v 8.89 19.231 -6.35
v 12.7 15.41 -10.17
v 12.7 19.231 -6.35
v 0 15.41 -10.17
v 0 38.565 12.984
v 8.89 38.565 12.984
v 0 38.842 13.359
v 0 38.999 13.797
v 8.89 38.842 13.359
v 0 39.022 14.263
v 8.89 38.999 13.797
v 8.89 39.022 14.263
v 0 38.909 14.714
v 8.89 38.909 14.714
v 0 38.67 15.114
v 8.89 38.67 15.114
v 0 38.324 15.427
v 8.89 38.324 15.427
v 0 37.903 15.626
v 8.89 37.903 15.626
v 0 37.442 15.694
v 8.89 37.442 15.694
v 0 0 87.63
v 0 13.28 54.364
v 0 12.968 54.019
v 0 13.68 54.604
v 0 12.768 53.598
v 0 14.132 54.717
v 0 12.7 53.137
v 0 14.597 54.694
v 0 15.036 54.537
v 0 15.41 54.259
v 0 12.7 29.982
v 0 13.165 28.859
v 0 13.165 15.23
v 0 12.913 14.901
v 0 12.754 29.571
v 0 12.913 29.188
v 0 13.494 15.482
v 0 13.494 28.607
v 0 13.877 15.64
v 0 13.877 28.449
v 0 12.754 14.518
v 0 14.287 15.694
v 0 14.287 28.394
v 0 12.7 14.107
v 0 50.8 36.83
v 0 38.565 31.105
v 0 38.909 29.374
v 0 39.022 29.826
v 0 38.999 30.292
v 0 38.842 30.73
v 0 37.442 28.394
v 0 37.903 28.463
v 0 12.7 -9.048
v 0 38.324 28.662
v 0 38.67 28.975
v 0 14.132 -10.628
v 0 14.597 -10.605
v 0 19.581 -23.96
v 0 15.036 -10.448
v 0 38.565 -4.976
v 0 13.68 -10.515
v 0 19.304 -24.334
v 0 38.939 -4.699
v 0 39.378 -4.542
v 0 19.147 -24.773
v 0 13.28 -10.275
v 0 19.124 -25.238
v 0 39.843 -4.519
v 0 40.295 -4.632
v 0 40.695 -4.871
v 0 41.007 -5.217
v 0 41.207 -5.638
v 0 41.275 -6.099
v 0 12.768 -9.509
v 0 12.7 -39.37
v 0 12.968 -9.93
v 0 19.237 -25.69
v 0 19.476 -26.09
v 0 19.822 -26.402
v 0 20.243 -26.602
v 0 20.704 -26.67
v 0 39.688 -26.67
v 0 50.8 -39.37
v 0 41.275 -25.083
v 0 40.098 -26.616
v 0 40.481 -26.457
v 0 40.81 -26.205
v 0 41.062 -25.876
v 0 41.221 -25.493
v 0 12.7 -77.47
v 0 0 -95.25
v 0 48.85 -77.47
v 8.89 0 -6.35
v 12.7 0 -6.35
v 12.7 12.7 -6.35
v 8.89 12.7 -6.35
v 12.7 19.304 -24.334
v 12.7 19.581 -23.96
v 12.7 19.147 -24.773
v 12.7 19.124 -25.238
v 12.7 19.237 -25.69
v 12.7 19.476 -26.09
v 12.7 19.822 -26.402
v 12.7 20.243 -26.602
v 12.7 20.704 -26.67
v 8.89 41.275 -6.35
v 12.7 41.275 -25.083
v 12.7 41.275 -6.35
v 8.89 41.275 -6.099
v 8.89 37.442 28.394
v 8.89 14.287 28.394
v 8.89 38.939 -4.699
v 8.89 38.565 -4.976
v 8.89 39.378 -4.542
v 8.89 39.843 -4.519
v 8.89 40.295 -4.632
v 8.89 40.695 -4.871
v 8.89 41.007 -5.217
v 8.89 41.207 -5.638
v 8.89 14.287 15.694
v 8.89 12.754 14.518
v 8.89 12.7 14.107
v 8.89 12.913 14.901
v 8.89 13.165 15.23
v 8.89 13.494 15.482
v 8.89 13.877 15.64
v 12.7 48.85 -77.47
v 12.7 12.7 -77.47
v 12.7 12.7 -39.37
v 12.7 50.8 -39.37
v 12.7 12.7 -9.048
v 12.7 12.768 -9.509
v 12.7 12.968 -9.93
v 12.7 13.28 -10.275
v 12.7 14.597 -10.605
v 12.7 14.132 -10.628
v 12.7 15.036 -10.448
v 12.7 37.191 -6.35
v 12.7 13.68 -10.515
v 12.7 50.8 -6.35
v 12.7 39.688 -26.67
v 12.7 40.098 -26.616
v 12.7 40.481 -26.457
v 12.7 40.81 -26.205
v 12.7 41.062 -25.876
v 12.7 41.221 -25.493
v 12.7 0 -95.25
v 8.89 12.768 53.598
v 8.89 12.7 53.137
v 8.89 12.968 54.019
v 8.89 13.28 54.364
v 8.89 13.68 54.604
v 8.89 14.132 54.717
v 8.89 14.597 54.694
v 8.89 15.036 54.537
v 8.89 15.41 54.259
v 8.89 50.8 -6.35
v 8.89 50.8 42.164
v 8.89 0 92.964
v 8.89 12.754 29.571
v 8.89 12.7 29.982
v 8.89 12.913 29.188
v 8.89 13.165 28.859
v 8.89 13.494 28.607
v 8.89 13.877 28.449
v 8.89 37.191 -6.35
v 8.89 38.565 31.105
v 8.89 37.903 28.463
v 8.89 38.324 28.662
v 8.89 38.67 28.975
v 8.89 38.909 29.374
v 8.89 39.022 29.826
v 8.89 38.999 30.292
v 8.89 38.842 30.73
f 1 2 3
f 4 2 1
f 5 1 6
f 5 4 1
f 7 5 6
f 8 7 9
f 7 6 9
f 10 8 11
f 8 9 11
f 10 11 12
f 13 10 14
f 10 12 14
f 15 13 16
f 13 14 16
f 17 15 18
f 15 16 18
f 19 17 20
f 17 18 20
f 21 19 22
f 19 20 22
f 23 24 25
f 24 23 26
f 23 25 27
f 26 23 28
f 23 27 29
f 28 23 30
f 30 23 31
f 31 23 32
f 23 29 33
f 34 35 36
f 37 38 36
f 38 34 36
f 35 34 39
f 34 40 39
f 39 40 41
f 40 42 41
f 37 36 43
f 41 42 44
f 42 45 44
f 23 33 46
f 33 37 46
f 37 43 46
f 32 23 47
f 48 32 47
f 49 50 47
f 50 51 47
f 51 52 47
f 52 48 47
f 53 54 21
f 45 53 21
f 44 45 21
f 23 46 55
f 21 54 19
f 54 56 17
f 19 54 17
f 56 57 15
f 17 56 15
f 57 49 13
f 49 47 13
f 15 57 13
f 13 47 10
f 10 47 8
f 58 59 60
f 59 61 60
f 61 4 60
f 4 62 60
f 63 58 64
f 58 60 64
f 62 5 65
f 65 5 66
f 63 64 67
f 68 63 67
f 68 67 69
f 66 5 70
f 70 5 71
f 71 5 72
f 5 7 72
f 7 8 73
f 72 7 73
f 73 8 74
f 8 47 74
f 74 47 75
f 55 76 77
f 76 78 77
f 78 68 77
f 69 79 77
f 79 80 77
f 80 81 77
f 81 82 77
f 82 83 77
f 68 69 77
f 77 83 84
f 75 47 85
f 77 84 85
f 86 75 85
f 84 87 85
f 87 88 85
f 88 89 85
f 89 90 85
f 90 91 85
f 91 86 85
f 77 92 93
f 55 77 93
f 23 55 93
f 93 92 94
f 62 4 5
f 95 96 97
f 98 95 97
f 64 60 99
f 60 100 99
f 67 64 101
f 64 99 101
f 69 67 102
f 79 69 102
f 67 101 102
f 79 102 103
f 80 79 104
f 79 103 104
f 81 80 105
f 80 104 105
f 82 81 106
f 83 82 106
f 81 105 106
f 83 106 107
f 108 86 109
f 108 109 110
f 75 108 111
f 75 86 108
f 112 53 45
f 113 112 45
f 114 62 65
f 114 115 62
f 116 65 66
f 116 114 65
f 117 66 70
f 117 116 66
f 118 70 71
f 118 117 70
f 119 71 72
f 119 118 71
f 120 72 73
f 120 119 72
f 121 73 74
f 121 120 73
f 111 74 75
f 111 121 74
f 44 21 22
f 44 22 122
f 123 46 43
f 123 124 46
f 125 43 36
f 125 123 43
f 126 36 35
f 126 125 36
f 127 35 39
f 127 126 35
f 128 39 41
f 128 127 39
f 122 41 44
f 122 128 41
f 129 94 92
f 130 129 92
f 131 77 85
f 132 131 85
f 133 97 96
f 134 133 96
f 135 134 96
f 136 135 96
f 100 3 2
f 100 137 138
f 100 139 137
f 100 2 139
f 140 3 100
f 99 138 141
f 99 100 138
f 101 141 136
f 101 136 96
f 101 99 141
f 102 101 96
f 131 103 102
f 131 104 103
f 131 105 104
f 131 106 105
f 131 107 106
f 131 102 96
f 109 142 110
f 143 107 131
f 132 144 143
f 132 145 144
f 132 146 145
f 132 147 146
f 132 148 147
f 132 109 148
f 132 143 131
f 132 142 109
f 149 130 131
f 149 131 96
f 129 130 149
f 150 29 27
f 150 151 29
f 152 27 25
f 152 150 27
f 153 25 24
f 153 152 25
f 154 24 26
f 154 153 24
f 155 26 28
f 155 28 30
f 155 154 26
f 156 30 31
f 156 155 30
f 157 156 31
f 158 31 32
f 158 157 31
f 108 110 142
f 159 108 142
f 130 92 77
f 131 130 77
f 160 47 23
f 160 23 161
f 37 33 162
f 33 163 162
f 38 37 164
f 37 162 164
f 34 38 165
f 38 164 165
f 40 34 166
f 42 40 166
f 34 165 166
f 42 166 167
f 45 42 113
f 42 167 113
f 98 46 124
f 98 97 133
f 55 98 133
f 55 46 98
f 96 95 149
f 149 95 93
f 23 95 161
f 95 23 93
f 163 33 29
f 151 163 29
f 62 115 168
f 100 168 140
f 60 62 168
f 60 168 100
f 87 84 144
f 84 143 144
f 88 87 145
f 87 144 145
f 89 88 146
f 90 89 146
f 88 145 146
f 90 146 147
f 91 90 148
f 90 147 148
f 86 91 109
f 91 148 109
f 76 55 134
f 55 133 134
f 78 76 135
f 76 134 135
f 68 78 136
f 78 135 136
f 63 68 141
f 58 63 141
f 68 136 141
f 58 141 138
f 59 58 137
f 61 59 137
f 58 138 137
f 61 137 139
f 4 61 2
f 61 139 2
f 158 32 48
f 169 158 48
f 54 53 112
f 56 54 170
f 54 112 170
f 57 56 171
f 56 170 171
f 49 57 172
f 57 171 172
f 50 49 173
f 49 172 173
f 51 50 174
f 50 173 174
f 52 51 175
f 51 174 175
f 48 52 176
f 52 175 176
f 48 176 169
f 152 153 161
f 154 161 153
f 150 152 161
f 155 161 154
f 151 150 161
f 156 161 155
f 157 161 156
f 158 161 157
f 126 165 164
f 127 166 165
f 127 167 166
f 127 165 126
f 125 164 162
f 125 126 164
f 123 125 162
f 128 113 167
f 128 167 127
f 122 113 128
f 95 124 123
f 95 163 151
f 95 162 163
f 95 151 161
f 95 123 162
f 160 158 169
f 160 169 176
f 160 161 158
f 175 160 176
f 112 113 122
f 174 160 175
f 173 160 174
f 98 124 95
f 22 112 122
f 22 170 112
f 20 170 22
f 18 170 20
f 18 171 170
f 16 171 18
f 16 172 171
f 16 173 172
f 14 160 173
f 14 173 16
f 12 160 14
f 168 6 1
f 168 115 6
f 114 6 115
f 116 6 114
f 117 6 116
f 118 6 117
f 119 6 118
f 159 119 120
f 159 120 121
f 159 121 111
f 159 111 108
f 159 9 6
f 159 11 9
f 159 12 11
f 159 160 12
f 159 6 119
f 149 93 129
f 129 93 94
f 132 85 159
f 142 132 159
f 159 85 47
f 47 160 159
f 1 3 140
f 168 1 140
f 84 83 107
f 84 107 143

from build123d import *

# Parameters (mm, degrees)
BOSS_EXTRUDE1_DEPTH    = 12.7
CUT_EXTRUDE1_START     = -62.002468855
CUT_EXTRUDE1_OUTLINE_W = 16
CUT_EXTRUDE1_OUTLINE_H = 80
CUT_EXTRUDE1_DEPTH     = 4.960197509
CUT_EXTRUDE2_START     = 12.7
CUT_EXTRUDE2_DEPTH     = 3.81
CUT_EXTRUDE3_REACH     = 110.694
FILLET1_R              = 1.5875


# Read off the part's stored shape, not the designer's step: Cut-Extrude1
with BuildPart() as part:
    # Sketch1 → Boss-Extrude1 (new body)
    with BuildSketch(Plane(origin=(0, 0, 0), x_dir=(0, 0, -1), z_dir=(1, 0, 0))):
        Polygon((-44.45, 50.8), (-95.25, 0), (95.25, 0), (77.47, 48.850148518), (77.47, 12.7), (39.37, 12.7), (39.37, 50.8), align=None)
    extrude(amount=BOSS_EXTRUDE1_DEPTH)

    # Cut-Extrude1 outline → Cut-Extrude1 (cut)
    with BuildSketch(Plane(origin=(0, 0, 0), x_dir=(0.920574617898324, 0.27617238536949745, 0.27617238536949446), z_dir=(0.39056673294247013, -0.6509445549041233, -0.6509445549041163)).offset(CUT_EXTRUDE1_START)):
        with Locations((31, 29)):
            Rectangle(CUT_EXTRUDE1_OUTLINE_W, CUT_EXTRUDE1_OUTLINE_H)
    extrude(amount=CUT_EXTRUDE1_DEPTH, mode=Mode.SUBTRACT)

    # Sketch1<4> → Cut-Extrude2 (cut)
    with BuildSketch(Plane(origin=(0, 0, 0), x_dir=(0, 0, -1), z_dir=(1, 0, 0)).offset(CUT_EXTRUDE2_START)):
        Polygon((-44.45, 50.8), (-95.25, 0), (6.35, 0), (6.35, 50.8), align=None)
    extrude(amount=-CUT_EXTRUDE2_DEPTH, mode=Mode.SUBTRACT)

    # Sketch3 → Cut-Extrude3 (cut, up to next)
    with BuildSketch(Plane.ZY, mode=Mode.PRIVATE) as cut_extrude3_sk1:
        Polygon((56.969487758, 12.7), (28.394487758, 41.275), (28.394487758, 12.7), align=None)
    cut_extrude3_tool1 = extrude(cut_extrude3_sk1.sketch, amount=-CUT_EXTRUDE3_REACH, mode=Mode.PRIVATE) & part.part
    # Sketch3 → Cut-Extrude3 (cut, up to next)
    with BuildSketch(Plane.ZY, mode=Mode.PRIVATE) as cut_extrude3_sk2:
        Polygon((15.694487758, 41.275), (15.694487758, 12.7), (-12.880512242, 12.7), align=None)
    cut_extrude3_tool2 = extrude(cut_extrude3_sk2.sketch, amount=-CUT_EXTRUDE3_REACH, mode=Mode.PRIVATE) & part.part
    # Sketch3 → Cut-Extrude3 (cut, up to next)
    with BuildSketch(Plane.ZY, mode=Mode.PRIVATE) as cut_extrude3_sk3:
        Polygon((-2.266024484, 41.275), (-26.67, 16.871024484), (-26.67, 41.275), align=None)
    cut_extrude3_tool3 = extrude(cut_extrude3_sk3.sketch, amount=-CUT_EXTRUDE3_REACH, mode=Mode.PRIVATE) & part.part
    add(cut_extrude3_tool1.solids().sort_by_distance((0, 22.225, 37.919488))[0], mode=Mode.SUBTRACT)
    add(cut_extrude3_tool2.solids().sort_by_distance((0, 22.225, 6.169488))[0], mode=Mode.SUBTRACT)
    add(cut_extrude3_tool3.solids().sort_by_distance((0, 33.140341, -18.535341))[0], mode=Mode.SUBTRACT)

    # Fillet1
    fillet1_edges = [part.edges().sort_by_distance(p)[0] for p in [
        (4.445, 12.7, 56.969487758),
        (4.445, 12.7, 28.394487758),
        (4.445, 41.275, 28.394487758),
        (6.35, 41.275, -26.67),
        (4.445, 41.275, -2.266024484),
        (6.35, 16.871024484, -26.67),
        (4.445, 41.275, 15.694487758),
        (6.35, 12.7, -12.880512242),
        (4.445, 12.7, 15.694487758),
    ]]
    fillet(fillet1_edges, radius=FILLET1_R)


solid = part.part
